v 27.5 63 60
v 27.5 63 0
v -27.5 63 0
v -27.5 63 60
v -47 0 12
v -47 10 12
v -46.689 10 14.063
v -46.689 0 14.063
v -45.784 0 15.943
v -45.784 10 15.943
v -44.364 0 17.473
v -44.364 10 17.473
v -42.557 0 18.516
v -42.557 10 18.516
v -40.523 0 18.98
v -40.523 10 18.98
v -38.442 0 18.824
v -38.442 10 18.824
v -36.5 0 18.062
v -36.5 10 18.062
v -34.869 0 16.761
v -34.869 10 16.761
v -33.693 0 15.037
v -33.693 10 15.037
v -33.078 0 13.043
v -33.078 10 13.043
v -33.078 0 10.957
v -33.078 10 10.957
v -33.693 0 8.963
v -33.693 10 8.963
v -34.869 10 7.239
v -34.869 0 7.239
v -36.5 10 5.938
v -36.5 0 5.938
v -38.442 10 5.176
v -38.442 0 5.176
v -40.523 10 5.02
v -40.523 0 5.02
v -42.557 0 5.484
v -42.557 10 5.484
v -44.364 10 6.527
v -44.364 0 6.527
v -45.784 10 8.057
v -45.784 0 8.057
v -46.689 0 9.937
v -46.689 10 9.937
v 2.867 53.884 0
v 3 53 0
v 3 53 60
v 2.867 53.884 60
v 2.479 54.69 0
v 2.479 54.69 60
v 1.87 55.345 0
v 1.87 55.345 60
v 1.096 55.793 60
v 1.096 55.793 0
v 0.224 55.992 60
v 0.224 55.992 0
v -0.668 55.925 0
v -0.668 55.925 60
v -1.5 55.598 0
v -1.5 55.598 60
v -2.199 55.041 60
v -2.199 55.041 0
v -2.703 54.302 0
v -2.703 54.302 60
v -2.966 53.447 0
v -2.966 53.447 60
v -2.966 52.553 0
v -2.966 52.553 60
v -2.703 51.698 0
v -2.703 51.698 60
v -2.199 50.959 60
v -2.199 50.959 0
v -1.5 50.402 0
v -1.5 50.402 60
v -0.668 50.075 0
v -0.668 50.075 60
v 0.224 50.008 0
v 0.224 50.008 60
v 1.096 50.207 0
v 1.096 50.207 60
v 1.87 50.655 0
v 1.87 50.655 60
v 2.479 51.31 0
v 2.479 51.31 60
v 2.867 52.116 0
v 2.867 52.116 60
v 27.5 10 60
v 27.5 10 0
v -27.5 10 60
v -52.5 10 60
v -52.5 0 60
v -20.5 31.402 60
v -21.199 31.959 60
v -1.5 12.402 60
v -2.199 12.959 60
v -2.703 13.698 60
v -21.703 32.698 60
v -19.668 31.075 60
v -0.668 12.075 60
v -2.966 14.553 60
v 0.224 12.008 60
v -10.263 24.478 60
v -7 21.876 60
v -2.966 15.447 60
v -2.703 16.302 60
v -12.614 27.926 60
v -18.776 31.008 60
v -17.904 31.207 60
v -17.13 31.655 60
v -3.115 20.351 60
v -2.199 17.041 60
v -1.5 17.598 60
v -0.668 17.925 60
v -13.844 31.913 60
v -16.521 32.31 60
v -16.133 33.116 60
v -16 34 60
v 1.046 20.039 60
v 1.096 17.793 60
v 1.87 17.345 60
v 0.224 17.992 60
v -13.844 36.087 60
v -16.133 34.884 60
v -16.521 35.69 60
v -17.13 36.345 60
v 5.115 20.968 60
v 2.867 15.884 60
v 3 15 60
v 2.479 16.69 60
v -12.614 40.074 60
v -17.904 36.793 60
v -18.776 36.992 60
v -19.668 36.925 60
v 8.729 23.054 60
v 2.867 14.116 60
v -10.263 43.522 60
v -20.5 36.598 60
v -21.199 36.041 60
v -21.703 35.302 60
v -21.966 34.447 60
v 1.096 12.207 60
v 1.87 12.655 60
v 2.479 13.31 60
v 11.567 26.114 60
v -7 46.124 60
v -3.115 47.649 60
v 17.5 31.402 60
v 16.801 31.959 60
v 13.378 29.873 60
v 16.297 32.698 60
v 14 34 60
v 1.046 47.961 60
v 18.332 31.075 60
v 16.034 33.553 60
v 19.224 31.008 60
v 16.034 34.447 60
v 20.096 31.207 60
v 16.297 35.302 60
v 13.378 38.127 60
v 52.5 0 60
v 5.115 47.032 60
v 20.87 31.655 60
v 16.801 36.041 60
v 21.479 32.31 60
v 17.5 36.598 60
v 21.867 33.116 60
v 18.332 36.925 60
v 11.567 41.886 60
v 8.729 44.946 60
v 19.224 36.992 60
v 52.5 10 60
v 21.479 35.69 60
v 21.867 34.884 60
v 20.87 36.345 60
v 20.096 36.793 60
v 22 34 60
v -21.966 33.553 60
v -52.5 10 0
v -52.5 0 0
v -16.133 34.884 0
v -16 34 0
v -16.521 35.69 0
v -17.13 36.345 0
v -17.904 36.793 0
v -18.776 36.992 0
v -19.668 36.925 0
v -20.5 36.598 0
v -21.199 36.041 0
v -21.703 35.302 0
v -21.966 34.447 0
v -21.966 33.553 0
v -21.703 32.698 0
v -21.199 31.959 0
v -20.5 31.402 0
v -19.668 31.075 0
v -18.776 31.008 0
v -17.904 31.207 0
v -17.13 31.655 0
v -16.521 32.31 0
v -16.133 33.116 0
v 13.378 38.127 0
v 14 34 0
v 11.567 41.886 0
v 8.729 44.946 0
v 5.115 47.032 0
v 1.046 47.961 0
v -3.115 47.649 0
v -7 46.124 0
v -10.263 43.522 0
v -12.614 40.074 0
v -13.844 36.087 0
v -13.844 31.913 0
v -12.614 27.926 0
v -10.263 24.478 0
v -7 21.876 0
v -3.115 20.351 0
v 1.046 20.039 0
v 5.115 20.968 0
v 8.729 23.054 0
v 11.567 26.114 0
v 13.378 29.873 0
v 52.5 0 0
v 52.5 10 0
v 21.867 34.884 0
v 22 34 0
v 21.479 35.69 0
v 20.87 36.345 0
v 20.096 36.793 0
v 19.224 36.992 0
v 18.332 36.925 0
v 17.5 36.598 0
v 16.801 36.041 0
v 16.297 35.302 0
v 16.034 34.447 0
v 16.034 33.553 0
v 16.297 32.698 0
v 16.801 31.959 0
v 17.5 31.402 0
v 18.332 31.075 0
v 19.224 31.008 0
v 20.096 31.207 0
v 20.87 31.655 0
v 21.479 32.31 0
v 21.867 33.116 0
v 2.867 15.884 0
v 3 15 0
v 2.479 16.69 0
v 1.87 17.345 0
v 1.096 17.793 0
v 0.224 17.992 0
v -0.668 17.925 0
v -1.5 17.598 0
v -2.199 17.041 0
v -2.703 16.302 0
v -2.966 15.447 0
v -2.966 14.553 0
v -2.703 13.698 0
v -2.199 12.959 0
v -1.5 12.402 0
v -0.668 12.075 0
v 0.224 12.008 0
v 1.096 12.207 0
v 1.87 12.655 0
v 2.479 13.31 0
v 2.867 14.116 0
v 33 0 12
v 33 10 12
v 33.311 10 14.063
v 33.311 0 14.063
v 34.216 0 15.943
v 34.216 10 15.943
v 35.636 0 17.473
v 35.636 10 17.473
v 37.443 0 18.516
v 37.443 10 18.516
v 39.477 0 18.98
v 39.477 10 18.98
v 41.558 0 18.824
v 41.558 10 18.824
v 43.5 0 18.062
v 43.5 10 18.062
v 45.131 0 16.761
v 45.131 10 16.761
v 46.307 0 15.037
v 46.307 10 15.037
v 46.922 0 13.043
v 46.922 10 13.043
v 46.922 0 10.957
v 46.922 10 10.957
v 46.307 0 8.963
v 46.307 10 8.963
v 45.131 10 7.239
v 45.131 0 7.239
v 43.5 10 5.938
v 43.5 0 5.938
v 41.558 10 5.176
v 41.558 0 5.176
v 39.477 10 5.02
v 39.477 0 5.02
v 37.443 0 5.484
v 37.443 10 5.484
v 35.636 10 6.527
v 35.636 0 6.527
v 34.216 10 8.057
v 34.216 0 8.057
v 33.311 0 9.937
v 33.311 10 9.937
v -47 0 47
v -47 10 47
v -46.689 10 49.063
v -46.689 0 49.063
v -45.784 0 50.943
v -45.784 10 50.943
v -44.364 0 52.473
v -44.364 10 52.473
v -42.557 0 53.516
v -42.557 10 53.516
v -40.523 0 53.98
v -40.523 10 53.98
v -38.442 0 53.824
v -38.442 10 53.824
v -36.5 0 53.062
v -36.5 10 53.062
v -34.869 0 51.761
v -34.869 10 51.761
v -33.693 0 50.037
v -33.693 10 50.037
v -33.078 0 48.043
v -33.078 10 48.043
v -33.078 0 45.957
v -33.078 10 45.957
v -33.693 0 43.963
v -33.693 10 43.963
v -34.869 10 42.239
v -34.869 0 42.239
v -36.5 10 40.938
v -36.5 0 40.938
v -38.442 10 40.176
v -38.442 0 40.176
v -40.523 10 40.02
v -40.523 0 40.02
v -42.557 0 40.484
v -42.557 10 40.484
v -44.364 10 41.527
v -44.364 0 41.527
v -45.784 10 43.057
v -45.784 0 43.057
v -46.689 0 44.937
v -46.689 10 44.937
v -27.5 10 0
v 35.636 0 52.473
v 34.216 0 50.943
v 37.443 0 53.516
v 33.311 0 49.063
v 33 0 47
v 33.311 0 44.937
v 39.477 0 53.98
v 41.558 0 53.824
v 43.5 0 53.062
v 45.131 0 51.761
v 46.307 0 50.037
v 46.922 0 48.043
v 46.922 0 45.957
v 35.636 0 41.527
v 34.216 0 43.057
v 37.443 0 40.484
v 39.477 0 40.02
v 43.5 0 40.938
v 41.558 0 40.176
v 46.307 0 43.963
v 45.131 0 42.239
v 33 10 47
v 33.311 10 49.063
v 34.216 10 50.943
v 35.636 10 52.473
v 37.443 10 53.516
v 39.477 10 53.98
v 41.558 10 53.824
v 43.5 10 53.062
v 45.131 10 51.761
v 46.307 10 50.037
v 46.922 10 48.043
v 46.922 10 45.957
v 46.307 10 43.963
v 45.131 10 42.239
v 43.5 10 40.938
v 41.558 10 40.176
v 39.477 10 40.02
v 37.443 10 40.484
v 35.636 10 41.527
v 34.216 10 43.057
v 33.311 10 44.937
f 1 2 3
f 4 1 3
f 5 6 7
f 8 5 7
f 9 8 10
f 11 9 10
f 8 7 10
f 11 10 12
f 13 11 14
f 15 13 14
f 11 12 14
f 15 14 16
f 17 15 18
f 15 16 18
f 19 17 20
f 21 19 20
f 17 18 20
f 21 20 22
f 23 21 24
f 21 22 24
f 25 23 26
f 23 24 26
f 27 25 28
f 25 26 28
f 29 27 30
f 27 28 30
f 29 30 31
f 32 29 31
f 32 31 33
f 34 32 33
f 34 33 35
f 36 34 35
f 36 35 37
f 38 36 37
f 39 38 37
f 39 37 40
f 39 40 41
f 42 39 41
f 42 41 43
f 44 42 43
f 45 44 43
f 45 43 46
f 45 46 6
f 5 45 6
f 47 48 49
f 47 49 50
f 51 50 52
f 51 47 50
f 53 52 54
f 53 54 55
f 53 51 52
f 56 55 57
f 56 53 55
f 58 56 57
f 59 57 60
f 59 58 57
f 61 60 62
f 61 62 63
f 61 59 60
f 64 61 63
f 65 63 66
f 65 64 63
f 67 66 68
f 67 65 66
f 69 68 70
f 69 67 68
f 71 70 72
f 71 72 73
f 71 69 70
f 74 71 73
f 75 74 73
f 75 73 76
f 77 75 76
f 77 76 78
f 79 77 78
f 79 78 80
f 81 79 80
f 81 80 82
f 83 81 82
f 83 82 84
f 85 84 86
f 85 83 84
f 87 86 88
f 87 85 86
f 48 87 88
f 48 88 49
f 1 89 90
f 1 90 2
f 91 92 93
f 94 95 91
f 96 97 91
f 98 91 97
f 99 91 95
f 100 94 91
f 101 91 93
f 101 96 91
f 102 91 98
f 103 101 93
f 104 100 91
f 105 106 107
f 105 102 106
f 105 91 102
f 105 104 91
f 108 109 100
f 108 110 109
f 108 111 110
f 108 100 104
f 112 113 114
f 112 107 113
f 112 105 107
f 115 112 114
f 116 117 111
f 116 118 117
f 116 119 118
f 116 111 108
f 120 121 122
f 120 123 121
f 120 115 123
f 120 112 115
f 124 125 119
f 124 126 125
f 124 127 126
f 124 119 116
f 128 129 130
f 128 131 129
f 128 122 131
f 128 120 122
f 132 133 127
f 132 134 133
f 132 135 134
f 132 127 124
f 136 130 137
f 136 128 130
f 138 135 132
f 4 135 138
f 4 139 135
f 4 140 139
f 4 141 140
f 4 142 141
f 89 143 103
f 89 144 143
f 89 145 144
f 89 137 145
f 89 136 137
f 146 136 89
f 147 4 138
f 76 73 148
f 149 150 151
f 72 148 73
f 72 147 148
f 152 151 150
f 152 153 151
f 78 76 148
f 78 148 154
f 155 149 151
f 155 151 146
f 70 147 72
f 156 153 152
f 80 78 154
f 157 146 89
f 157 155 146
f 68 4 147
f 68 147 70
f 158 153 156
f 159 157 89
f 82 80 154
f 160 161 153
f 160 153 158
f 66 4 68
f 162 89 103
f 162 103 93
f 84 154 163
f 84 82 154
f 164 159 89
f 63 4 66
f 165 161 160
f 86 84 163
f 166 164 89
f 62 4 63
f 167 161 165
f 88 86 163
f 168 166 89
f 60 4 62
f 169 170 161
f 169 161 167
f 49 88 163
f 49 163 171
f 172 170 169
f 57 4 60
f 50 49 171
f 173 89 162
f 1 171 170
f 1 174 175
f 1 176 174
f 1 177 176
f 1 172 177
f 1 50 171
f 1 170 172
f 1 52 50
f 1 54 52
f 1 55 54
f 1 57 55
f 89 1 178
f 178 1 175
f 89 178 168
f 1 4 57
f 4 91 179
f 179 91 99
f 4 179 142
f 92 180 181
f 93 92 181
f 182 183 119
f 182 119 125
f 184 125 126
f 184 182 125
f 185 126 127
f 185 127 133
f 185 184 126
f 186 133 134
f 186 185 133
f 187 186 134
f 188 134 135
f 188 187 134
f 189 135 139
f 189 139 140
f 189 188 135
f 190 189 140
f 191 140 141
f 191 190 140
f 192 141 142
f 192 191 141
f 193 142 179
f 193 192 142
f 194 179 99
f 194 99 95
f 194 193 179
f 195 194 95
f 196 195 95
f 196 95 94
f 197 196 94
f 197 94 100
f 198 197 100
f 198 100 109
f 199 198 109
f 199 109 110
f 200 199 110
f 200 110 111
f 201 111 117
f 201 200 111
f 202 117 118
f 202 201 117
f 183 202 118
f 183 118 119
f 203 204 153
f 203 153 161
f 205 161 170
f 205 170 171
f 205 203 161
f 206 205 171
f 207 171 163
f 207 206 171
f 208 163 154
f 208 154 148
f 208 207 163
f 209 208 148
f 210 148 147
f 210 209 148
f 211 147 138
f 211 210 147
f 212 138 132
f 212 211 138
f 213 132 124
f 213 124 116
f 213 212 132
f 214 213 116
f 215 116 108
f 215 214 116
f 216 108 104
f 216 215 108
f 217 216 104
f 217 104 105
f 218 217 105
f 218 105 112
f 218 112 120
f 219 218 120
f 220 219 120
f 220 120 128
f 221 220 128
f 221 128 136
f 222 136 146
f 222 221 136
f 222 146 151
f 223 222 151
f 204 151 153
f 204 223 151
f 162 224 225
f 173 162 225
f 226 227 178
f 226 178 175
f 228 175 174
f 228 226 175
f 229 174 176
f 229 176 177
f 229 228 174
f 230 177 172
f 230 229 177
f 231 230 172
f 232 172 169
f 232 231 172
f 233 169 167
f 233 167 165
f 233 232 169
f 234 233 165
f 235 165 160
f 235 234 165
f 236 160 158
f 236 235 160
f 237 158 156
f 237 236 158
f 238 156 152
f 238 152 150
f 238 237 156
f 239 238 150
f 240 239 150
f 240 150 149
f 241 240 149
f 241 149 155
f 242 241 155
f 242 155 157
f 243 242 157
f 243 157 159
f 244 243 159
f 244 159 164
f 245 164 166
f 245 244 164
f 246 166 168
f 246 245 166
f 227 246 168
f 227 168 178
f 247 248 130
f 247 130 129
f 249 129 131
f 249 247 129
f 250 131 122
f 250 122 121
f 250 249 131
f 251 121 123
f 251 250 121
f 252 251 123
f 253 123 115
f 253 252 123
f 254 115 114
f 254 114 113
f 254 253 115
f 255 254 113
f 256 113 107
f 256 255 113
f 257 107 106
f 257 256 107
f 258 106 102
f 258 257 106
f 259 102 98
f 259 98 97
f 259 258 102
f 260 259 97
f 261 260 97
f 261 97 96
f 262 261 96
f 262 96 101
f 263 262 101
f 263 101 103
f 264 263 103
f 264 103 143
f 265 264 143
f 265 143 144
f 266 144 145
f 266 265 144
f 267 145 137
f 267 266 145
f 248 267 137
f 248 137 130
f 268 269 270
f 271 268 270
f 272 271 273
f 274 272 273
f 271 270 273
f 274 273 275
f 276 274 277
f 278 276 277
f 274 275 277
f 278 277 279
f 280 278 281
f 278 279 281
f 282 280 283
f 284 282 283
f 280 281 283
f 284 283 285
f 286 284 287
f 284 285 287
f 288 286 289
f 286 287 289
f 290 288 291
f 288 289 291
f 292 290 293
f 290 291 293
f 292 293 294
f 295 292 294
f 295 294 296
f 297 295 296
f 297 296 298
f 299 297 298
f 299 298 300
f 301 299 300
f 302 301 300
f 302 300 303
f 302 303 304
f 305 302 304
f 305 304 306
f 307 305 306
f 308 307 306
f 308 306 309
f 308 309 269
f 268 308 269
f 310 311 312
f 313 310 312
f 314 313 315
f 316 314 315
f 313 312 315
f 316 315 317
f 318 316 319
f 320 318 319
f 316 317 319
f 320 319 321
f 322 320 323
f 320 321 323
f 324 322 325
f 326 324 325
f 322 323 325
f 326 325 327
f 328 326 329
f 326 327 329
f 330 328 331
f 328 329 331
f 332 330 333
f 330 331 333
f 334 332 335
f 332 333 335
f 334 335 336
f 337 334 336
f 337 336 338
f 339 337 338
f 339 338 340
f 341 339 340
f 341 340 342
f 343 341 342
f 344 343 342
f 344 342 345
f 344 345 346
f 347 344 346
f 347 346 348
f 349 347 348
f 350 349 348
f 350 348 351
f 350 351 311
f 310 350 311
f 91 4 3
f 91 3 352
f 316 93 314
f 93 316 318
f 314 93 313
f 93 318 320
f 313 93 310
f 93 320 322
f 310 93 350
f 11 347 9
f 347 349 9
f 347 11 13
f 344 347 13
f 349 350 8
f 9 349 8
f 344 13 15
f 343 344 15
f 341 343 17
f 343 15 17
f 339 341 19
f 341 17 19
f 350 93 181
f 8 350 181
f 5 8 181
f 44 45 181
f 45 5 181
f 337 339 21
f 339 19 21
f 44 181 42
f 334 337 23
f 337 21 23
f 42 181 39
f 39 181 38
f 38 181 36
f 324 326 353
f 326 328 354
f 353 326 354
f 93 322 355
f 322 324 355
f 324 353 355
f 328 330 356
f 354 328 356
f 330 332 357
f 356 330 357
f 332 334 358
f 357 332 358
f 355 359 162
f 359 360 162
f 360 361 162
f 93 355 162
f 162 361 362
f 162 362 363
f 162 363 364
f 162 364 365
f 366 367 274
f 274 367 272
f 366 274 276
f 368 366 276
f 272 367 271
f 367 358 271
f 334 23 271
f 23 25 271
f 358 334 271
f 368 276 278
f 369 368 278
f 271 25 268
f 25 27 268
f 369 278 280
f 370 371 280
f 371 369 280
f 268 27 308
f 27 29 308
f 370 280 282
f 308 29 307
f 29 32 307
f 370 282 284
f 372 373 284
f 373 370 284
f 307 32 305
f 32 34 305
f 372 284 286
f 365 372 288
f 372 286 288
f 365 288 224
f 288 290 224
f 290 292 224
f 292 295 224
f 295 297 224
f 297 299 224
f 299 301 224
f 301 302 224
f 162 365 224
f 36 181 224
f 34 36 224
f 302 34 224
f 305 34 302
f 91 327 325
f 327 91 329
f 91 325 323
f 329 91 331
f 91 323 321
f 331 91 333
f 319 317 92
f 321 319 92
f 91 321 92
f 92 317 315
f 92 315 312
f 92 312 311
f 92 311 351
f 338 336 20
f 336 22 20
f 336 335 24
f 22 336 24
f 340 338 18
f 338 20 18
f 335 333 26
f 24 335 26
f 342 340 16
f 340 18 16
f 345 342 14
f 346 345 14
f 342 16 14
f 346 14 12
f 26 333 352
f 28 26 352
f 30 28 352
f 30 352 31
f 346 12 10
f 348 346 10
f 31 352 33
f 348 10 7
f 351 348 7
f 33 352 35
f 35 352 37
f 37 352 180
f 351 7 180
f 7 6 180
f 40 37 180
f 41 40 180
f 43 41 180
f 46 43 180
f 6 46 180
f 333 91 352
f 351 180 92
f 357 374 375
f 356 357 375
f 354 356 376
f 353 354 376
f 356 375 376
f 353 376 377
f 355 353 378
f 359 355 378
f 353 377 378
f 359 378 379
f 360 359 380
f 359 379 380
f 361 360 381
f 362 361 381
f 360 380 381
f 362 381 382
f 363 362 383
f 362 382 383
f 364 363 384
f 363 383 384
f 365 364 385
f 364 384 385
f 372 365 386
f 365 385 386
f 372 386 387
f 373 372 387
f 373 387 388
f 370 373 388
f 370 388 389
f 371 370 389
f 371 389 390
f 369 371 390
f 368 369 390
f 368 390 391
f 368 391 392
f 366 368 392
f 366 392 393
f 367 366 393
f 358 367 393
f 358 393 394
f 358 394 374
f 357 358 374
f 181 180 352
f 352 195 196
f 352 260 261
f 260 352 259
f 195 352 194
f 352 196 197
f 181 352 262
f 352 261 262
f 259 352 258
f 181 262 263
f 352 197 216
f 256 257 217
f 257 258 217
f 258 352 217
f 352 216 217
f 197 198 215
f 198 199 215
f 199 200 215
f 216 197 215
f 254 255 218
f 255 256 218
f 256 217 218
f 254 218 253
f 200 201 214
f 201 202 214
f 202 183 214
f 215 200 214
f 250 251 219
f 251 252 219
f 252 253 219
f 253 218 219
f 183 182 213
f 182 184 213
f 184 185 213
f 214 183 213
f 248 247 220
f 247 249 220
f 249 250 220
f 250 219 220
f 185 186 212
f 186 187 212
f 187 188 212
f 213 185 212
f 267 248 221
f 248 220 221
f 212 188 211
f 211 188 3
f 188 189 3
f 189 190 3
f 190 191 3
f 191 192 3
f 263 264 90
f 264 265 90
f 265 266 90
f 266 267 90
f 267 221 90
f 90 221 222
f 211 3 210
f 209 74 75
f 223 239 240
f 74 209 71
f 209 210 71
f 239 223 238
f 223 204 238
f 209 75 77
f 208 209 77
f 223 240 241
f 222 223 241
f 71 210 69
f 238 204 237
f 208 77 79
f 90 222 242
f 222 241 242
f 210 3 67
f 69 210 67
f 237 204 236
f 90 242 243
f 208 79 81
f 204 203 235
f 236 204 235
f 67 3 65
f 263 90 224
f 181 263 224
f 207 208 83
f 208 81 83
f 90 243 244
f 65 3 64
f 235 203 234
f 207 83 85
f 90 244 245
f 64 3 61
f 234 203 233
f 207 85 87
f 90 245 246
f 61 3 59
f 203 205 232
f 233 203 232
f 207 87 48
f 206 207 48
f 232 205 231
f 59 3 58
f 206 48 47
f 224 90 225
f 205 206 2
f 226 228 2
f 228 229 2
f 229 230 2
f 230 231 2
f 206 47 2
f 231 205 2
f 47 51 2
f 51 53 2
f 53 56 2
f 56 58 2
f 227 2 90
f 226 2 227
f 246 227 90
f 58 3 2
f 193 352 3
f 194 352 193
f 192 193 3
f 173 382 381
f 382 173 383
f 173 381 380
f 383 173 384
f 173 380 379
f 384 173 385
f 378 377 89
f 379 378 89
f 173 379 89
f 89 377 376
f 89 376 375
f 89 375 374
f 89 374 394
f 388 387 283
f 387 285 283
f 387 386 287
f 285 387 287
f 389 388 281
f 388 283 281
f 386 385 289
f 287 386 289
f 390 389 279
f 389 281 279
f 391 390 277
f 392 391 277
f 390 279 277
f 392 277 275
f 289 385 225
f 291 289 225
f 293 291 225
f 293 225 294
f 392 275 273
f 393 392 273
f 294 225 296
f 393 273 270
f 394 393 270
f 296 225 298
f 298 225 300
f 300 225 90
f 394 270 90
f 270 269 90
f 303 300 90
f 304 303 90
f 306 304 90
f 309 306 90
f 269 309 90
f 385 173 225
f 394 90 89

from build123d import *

# Parameters (mm, degrees)
F0_R     = 3
F0_R_2   = 14
F1_DEPTH = 60
F2_R     = 7
F3_DEPTH = 25


with BuildPart() as f1:
    # F0 (on Top) → F1 (new body)
    with BuildSketch(Plane.XY):
        Polygon((-52.5, 10), (-52.5, 0), (52.5, 0), (52.5, 10), (27.5, 10), (27.5, 63), (-27.5, 63), (-27.5, 10), align=None)
        with Locations((0, 15)):
            Circle(F0_R, mode=Mode.SUBTRACT)
        with Locations((-19, 34)):
            Circle(F0_R, mode=Mode.SUBTRACT)
        with Locations((0, 34)):
            Circle(F0_R_2, mode=Mode.SUBTRACT)
        with Locations((19, 34)):
            Circle(F0_R, mode=Mode.SUBTRACT)
        with Locations((0, 53)):
            Circle(F0_R, mode=Mode.SUBTRACT)
    extrude(amount=F1_DEPTH)

    # F2 (on face) → F3 (cut)
    with BuildSketch(Plane(origin=(0, 10, 0), x_dir=(-1, 0, 0), z_dir=(0, 1, 0))):
        with Locations((-40, 47)):
            Circle(F2_R)
        with Locations((-40, 12)):
            Circle(F2_R)
        with Locations((40, 47)):
            Circle(F2_R)
        with Locations((40, 12)):
            Circle(F2_R)
    extrude(amount=-F3_DEPTH, mode=Mode.SUBTRACT)


solid = f1.part
